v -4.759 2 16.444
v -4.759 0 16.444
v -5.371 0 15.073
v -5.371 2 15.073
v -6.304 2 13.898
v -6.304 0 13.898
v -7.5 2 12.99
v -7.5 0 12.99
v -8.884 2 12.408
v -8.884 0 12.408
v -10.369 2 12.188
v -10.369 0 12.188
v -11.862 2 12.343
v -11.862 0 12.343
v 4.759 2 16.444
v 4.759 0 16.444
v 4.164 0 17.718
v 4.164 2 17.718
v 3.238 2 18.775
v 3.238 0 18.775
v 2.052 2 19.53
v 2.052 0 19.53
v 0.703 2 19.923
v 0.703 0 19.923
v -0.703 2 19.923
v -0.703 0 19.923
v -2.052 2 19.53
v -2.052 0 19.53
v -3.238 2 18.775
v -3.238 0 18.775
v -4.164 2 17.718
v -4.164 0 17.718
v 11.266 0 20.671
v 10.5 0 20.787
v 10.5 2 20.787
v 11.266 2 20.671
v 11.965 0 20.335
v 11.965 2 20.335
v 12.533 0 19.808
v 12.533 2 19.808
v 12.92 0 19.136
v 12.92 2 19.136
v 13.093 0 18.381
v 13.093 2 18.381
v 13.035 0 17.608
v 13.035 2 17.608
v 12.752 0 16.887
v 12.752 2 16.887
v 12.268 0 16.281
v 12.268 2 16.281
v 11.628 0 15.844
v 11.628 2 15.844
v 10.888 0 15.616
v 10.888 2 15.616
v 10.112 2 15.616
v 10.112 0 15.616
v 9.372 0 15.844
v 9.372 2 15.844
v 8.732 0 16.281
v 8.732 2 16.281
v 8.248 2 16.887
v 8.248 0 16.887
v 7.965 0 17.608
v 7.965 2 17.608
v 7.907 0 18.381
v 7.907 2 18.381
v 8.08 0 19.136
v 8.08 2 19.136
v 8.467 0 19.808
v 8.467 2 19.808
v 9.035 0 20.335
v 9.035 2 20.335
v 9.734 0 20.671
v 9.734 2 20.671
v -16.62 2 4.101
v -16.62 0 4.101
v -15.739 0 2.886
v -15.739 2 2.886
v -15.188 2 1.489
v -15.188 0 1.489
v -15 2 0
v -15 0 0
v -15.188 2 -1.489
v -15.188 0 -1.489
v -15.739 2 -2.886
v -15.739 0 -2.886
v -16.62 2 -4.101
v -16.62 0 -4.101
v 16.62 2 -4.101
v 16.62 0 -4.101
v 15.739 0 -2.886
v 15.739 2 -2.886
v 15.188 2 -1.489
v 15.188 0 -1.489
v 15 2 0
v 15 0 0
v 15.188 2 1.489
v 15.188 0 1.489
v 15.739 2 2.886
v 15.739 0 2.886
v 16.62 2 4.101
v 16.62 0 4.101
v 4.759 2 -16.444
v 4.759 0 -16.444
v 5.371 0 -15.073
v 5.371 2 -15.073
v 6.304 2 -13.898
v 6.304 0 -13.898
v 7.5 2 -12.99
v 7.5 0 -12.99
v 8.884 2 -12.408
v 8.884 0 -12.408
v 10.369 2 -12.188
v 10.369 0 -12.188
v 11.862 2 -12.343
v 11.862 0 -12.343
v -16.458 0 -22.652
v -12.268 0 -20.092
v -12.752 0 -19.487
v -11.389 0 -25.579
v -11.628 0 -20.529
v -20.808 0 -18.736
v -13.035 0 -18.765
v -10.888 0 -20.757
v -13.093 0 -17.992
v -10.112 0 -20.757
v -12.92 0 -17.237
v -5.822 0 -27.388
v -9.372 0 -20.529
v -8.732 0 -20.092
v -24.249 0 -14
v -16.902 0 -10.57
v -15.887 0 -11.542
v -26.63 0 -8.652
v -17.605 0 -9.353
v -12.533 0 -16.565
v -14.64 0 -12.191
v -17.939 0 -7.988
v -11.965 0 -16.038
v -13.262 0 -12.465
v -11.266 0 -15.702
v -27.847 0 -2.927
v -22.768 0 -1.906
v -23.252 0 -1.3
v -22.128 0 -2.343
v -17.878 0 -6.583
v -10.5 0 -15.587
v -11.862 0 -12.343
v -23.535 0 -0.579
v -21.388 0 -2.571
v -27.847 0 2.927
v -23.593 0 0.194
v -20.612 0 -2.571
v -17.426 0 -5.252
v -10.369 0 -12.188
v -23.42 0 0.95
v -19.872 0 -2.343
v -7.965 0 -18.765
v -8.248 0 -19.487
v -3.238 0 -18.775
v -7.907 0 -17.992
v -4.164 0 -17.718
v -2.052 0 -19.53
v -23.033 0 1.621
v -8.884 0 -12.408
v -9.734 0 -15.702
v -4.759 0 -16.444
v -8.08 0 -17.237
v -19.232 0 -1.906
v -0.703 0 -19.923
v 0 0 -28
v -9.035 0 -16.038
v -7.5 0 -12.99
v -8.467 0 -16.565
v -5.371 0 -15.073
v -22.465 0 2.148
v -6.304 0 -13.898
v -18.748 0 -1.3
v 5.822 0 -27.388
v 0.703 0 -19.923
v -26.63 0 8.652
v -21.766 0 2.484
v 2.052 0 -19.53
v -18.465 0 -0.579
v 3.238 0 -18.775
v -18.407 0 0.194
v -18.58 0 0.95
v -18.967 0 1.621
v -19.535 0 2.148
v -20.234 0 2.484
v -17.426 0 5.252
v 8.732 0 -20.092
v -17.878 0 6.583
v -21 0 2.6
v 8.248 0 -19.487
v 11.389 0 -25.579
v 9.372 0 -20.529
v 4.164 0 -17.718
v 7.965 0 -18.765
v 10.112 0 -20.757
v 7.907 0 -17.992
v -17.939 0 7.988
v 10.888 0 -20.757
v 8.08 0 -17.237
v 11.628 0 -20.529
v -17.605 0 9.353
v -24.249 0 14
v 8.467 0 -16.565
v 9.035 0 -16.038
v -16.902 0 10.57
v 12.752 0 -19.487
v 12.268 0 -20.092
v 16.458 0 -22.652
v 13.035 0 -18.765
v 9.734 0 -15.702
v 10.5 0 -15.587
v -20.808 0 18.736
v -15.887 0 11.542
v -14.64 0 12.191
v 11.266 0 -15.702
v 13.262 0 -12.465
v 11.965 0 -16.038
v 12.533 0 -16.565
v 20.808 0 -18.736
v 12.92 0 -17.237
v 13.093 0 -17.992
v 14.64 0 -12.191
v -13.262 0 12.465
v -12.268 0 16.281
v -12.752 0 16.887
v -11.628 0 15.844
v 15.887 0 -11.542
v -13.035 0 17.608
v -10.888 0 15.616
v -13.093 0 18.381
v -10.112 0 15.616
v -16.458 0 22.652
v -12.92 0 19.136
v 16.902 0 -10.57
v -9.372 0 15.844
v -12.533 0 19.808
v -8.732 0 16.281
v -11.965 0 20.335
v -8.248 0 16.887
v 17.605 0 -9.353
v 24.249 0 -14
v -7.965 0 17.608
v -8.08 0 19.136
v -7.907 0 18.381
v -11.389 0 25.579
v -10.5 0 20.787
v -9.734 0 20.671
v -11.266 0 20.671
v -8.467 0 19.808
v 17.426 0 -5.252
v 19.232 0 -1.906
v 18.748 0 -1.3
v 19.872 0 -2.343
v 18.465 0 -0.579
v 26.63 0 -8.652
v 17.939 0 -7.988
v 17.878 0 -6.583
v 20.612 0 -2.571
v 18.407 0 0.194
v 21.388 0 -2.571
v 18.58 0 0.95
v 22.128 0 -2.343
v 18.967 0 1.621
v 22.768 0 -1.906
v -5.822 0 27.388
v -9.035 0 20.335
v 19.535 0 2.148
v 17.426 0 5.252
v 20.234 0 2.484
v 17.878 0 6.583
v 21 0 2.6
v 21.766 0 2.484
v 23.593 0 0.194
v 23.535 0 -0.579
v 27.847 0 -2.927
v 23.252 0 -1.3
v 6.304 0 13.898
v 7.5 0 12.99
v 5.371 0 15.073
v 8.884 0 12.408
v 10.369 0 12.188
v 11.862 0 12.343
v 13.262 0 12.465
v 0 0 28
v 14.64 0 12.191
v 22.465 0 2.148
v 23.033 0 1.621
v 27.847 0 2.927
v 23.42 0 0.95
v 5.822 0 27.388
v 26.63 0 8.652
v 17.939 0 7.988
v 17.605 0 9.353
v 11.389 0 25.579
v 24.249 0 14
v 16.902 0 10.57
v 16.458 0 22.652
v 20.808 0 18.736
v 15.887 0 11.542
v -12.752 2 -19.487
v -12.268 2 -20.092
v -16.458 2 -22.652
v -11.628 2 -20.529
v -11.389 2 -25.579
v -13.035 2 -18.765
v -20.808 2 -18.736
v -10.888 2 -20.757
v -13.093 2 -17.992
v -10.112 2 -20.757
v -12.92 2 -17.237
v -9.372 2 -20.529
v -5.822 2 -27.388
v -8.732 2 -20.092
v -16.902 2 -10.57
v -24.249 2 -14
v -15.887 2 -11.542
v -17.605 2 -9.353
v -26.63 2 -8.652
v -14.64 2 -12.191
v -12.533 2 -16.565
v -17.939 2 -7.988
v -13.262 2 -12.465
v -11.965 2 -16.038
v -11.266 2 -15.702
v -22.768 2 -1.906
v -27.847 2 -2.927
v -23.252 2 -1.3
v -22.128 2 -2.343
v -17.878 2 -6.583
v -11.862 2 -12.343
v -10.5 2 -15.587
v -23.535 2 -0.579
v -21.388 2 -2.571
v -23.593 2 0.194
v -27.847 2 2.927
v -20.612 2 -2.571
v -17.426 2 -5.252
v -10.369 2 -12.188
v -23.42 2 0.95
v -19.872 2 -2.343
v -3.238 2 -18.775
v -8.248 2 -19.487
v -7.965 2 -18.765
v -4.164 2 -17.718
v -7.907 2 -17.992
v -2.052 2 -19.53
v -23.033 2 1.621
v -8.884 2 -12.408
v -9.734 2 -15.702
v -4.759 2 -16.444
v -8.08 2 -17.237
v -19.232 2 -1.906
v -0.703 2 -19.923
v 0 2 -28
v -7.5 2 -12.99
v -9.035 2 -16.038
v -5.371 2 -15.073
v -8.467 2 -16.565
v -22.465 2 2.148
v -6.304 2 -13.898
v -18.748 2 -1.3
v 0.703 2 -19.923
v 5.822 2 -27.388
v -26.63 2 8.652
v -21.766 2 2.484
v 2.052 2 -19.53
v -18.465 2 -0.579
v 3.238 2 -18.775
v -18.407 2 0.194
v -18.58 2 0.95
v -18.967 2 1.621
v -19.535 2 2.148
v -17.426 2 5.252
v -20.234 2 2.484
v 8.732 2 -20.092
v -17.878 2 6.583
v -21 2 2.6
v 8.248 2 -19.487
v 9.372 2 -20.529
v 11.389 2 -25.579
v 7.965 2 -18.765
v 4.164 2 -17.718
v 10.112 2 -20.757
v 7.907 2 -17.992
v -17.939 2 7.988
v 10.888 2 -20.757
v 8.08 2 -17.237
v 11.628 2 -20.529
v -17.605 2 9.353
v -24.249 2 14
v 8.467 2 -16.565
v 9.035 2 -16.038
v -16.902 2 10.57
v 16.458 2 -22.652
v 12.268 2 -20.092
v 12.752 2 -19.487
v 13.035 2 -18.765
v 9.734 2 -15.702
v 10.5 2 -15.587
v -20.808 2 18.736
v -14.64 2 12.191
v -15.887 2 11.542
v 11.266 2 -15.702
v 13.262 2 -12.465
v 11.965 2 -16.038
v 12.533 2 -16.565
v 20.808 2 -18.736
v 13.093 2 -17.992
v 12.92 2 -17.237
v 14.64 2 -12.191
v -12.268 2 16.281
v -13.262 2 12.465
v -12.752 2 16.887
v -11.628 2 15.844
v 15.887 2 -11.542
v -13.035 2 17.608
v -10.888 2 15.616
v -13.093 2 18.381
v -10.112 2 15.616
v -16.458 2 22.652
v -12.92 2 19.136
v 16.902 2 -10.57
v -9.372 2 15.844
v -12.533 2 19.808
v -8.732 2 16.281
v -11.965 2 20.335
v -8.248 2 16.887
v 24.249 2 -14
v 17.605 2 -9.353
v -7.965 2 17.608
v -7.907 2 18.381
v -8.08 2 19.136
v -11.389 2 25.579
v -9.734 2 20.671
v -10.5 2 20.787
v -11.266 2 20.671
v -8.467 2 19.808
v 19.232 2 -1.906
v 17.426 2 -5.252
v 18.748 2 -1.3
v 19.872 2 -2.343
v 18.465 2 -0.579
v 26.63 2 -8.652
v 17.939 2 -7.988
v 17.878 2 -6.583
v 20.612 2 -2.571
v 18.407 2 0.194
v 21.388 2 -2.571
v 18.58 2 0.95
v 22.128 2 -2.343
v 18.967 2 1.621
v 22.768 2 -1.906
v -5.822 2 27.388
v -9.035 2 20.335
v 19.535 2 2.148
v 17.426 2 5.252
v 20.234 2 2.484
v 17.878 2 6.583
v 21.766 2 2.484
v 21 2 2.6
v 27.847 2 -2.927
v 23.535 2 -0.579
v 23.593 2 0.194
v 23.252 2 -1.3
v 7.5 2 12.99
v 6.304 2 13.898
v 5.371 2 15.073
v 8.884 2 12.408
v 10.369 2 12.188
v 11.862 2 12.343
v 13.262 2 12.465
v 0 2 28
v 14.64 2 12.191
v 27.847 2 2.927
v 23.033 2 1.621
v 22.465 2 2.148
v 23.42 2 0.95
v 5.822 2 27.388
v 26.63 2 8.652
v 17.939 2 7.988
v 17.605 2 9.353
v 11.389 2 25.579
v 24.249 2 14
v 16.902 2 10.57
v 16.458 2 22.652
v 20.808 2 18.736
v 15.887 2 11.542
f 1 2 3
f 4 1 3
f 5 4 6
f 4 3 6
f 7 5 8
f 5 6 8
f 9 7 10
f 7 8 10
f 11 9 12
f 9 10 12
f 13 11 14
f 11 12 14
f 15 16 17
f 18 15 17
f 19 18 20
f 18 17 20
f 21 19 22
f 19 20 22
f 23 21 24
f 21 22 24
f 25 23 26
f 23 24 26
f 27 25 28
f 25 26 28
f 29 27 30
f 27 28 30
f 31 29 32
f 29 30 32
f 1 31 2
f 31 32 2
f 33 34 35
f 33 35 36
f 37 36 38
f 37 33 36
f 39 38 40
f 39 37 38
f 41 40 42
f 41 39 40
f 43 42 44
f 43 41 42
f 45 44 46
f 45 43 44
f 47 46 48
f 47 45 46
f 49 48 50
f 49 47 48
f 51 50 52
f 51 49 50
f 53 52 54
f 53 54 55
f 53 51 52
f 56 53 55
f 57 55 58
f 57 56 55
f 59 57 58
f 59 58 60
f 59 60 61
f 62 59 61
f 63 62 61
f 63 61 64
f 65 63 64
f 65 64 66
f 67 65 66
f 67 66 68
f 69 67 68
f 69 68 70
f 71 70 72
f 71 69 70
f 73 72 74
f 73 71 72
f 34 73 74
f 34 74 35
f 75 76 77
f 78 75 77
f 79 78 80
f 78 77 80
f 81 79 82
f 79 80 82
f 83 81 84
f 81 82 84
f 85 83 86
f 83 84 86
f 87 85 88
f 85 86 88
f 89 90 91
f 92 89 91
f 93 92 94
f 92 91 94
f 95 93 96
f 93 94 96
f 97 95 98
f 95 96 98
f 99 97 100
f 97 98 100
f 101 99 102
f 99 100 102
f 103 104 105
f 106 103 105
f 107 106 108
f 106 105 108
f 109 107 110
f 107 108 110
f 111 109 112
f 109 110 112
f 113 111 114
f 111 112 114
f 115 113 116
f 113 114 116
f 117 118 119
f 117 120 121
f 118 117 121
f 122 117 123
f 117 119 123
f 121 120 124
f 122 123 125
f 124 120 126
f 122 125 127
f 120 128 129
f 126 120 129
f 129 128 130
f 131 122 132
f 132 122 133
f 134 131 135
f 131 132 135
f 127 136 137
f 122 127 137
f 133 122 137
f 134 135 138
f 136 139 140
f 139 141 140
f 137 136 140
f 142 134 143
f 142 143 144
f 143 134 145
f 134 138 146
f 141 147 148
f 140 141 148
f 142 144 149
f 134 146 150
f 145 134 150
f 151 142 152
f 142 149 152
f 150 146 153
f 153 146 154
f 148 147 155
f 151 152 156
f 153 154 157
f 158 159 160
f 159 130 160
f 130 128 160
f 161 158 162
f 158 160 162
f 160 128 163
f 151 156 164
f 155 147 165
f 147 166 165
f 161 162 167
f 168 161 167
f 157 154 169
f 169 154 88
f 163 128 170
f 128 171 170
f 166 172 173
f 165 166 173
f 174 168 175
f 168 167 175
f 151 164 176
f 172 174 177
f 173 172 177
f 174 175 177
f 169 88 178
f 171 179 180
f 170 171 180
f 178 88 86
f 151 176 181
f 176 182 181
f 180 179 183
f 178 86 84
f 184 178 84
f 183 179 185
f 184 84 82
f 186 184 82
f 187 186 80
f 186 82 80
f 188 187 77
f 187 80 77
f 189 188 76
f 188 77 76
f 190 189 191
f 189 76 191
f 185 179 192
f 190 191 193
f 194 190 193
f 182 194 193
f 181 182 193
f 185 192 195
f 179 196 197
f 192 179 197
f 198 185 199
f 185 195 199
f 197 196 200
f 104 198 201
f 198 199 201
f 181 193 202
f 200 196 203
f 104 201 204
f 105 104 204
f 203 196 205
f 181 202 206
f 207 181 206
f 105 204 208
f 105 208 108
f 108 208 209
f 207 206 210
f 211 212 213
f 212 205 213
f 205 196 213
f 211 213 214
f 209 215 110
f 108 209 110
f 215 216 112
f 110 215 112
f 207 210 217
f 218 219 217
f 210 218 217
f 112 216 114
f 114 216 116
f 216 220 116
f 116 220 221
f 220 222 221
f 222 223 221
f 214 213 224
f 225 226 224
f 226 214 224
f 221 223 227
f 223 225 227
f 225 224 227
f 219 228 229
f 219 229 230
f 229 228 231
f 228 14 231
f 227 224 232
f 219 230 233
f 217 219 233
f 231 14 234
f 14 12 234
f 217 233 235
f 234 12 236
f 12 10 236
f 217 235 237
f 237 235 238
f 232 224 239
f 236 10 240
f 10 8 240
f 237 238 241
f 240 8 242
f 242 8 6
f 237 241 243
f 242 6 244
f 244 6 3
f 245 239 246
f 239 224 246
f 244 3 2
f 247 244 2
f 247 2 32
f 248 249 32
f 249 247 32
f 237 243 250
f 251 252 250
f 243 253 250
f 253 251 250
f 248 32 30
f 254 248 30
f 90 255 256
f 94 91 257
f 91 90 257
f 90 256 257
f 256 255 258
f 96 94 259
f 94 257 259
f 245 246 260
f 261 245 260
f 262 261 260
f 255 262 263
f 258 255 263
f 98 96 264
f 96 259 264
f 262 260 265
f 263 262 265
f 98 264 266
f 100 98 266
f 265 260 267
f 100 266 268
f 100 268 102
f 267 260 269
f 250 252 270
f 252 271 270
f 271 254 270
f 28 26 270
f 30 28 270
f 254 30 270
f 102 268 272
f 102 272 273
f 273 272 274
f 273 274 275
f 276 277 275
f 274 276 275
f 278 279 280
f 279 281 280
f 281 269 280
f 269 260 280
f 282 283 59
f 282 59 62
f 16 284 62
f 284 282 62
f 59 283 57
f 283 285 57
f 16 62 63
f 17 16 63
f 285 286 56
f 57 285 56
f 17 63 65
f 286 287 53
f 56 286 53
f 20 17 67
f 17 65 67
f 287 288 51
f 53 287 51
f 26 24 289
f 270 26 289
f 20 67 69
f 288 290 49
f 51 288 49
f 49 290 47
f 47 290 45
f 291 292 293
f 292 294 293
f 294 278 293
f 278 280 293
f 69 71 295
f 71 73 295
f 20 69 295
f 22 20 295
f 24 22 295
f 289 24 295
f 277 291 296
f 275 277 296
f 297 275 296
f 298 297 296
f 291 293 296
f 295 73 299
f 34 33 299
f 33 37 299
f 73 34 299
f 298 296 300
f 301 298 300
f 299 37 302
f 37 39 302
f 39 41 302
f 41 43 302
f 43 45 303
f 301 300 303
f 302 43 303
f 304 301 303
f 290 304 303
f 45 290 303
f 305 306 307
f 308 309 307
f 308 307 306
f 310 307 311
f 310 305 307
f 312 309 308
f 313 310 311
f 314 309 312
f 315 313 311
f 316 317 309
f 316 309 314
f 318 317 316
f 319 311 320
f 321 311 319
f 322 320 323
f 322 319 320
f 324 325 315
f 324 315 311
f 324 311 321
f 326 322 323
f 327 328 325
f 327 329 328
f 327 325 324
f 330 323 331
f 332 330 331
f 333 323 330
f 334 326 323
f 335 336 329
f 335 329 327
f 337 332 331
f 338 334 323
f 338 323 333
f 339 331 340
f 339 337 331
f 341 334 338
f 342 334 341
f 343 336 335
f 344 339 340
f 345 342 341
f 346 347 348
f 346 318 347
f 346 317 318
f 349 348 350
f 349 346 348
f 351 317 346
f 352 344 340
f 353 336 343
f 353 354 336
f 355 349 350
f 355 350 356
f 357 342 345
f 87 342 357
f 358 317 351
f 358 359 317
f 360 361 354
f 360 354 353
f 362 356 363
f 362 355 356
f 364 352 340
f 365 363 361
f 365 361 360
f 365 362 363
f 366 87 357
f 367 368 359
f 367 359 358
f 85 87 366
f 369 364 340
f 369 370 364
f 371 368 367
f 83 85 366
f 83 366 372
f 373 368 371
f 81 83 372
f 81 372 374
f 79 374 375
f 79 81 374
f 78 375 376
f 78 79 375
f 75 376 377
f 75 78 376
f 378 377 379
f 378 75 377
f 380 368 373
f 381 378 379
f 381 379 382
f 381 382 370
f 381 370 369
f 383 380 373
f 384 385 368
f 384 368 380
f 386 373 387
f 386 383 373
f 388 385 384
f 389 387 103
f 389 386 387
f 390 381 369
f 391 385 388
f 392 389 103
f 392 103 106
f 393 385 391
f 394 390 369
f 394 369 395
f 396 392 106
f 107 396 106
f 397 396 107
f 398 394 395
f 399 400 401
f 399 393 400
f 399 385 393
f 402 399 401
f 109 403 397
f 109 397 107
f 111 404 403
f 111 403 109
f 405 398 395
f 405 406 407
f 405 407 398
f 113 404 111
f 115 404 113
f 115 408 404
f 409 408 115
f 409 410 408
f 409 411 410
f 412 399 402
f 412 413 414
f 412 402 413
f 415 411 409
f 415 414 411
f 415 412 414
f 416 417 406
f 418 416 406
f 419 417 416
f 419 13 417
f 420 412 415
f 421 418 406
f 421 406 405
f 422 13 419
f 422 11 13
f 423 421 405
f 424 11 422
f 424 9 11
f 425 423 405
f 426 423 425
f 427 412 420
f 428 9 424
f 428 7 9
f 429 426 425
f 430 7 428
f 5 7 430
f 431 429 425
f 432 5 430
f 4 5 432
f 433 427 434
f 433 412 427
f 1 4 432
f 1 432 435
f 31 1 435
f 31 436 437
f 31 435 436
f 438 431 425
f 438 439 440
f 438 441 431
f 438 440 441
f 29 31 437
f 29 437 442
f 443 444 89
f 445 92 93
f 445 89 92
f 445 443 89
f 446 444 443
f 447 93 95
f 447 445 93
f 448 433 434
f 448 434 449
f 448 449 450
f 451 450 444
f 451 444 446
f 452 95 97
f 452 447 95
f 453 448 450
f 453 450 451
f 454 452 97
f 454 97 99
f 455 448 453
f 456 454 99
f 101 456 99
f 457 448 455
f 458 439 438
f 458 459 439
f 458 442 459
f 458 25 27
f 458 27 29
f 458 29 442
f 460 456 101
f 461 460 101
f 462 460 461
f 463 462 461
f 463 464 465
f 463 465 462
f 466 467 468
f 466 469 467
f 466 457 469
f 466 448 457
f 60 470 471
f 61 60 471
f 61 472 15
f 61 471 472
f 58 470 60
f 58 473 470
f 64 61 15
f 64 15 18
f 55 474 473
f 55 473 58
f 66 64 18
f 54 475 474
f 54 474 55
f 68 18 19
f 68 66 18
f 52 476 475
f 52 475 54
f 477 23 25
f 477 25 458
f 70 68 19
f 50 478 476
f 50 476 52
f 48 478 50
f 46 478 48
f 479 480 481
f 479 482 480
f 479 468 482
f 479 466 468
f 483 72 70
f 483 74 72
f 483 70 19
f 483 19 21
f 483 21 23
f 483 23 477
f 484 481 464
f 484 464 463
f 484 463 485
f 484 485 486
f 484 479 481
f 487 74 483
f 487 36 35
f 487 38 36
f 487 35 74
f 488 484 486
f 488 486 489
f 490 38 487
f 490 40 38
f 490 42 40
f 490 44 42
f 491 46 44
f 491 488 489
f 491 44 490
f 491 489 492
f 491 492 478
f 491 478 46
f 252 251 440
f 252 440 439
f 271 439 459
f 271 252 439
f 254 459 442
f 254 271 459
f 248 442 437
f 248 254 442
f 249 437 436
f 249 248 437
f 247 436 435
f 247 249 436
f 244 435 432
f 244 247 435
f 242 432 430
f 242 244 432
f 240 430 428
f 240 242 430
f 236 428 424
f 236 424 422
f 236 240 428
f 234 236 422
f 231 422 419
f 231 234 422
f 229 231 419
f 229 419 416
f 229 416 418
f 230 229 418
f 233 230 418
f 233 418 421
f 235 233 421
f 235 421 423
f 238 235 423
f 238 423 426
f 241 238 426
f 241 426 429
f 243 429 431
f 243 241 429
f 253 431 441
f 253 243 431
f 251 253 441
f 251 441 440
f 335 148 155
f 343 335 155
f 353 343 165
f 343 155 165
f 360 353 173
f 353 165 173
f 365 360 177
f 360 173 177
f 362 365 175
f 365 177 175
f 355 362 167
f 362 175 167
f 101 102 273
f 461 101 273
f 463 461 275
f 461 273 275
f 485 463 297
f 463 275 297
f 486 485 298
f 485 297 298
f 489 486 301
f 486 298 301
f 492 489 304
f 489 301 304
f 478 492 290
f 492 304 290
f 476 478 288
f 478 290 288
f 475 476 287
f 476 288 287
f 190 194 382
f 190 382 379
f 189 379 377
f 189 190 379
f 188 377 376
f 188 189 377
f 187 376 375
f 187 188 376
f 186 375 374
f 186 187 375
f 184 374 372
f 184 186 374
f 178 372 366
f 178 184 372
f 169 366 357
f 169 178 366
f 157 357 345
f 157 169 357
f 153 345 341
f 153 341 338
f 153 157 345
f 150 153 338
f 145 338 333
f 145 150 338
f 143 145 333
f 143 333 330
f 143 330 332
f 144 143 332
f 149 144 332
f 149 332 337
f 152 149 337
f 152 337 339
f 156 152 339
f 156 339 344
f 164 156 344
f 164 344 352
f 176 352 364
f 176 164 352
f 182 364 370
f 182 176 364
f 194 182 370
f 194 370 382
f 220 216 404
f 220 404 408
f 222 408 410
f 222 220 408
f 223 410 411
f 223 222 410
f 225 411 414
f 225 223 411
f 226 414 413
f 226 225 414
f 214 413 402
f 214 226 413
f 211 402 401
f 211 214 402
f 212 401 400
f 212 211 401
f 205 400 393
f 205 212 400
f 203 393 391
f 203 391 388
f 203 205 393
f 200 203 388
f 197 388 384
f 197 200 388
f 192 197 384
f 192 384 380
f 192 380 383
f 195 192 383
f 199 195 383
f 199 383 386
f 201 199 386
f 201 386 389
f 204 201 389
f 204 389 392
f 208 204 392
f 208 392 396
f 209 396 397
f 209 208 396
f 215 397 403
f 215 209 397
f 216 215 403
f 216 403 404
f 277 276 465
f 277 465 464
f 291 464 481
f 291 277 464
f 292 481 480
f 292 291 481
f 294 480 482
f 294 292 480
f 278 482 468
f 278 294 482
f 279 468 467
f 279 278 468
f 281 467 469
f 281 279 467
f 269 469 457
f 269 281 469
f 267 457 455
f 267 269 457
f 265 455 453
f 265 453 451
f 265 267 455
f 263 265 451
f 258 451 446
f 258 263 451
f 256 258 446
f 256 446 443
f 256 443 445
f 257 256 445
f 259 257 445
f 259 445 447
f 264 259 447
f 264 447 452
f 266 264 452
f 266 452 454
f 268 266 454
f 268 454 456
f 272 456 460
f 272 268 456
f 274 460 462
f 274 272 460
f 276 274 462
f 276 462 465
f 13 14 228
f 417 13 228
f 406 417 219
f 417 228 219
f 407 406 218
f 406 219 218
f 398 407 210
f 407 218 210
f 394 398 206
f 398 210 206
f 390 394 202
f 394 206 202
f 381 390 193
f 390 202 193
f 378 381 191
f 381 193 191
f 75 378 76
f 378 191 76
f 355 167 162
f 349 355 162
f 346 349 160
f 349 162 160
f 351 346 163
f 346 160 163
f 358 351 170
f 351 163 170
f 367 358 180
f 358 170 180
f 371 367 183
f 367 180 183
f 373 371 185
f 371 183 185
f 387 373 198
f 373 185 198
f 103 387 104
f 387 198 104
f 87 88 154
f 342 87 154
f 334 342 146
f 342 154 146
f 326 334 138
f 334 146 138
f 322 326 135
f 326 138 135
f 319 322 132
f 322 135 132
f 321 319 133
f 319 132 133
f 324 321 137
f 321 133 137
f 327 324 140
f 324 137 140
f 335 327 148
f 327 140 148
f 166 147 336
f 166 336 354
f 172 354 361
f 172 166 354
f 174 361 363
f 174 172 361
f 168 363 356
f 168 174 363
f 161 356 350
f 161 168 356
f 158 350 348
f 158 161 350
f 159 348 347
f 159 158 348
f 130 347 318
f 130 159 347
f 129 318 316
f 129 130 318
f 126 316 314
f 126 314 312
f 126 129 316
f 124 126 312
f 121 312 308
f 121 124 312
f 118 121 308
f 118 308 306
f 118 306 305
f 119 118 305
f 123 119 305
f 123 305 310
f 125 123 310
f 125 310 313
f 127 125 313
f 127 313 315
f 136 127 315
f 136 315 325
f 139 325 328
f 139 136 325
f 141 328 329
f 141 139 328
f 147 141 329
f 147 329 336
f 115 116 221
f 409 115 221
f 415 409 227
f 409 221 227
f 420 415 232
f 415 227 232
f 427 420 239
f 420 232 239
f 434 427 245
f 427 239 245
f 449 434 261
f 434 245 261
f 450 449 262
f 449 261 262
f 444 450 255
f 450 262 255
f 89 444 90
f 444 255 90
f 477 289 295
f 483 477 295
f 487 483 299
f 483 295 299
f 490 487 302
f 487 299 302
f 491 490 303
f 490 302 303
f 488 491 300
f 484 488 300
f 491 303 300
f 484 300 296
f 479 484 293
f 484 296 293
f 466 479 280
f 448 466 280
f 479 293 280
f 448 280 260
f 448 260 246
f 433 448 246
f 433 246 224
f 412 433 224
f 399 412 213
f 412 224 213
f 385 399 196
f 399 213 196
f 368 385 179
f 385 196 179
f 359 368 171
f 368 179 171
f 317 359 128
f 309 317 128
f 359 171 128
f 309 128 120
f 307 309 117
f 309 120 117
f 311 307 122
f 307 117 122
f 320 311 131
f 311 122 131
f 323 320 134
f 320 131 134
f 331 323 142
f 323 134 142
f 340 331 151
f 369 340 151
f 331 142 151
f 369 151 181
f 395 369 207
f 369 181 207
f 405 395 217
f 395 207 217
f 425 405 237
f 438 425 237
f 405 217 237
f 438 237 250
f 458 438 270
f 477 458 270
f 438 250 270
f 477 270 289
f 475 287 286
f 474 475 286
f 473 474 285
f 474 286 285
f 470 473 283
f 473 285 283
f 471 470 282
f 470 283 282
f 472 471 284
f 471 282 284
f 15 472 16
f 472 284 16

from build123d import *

# Parameters (mm, degrees)
SKETCH_1_R               = 28
SKETCH_1_R_2             = 2.6
EXTRUDE_1_DEPTH          = 2
CUT_EXTRUDE_2_DEPTH      = 40.648455203
CUT_EXTRUDE_2_DEPTH_BACK = 40.648455203


with BuildPart() as part:
    # 草图1 → 凸台-拉伸1 (new body)
    with BuildSketch(Plane(origin=(0, 0, 0), x_dir=(1, 0, 0), z_dir=(0, 1, 0))):
        with Locations(Location((0, 0, 0), (0, 0, 270))):
            Circle(SKETCH_1_R)
        with Locations(Location((10.5, 18.186533479, 0), (0, 0, 270))):
            Circle(SKETCH_1_R_2, mode=Mode.SUBTRACT)
        with Locations(Location((21, 0, 0), (0, 0, 270))):
            Circle(SKETCH_1_R_2, mode=Mode.SUBTRACT)
        with Locations(Location((10.5, -18.186533479, 0), (0, 0, 270))):
            Circle(SKETCH_1_R_2, mode=Mode.SUBTRACT)
        with Locations(Location((-10.5, -18.186533479, 0), (0, 0, 270))):
            Circle(SKETCH_1_R_2, mode=Mode.SUBTRACT)
        with Locations(Location((-21, 0, 0), (0, 0, 270))):
            Circle(SKETCH_1_R_2, mode=Mode.SUBTRACT)
        with Locations(Location((-10.5, 18.186533479, 0), (0, 0, 270))):
            Circle(SKETCH_1_R_2, mode=Mode.SUBTRACT)
    extrude(amount=EXTRUDE_1_DEPTH)

    # 草图4 → 切除-拉伸2 (cut, two sides: drawn at the far end of the back side and taken through both)
    with BuildSketch(Plane(origin=(0, 2, 0), x_dir=(1, 0, 0), z_dir=(0, 1, 0)).offset(-CUT_EXTRUDE_2_DEPTH_BACK)):
        with BuildLine():
            ThreePointArc((4.758569662, 16.444127766), (7.4999998, 12.990381172), (11.861747108, 12.343105991))
            ThreePointArc((11.861747108, 12.343105991), (17.29701741, 9.986437924), (16.620317219, 4.10102167))
            ThreePointArc((16.620317219, 4.10102167), (15, 2.31e-07), (16.620316904, -4.101021333))
            ThreePointArc((16.620316904, -4.101021333), (17.297017641, -9.986437525), (11.861747557, -12.343106096))
            ThreePointArc((11.861747557, -12.343106096), (7.5000002, -12.990380941), (4.758569796, -16.444127324))
            ThreePointArc((4.758569796, -16.444127324), (2.31e-07, -19.972875449), (-4.758569662, -16.444127766))
            ThreePointArc((-4.758569662, -16.444127766), (-7.4999998, -12.990381172), (-11.861747108, -12.343105991))
            ThreePointArc((-11.861747108, -12.343105991), (-17.29701741, -9.986437924), (-16.620317219, -4.10102167))
            ThreePointArc((-16.620317219, -4.10102167), (-15, -2.31e-07), (-16.620316904, 4.101021333))
            ThreePointArc((-16.620316904, 4.101021333), (-17.297017641, 9.986437525), (-11.861747557, 12.343106096))
            ThreePointArc((-11.861747557, 12.343106096), (-7.5000002, 12.990380941), (-4.758569796, 16.444127324))
            ThreePointArc((-4.758569796, 16.444127324), (-2.31e-07, 19.972875449), (4.758569662, 16.444127766))
        make_face()
    extrude(amount=CUT_EXTRUDE_2_DEPTH + CUT_EXTRUDE_2_DEPTH_BACK, mode=Mode.SUBTRACT)


solid = part.part
